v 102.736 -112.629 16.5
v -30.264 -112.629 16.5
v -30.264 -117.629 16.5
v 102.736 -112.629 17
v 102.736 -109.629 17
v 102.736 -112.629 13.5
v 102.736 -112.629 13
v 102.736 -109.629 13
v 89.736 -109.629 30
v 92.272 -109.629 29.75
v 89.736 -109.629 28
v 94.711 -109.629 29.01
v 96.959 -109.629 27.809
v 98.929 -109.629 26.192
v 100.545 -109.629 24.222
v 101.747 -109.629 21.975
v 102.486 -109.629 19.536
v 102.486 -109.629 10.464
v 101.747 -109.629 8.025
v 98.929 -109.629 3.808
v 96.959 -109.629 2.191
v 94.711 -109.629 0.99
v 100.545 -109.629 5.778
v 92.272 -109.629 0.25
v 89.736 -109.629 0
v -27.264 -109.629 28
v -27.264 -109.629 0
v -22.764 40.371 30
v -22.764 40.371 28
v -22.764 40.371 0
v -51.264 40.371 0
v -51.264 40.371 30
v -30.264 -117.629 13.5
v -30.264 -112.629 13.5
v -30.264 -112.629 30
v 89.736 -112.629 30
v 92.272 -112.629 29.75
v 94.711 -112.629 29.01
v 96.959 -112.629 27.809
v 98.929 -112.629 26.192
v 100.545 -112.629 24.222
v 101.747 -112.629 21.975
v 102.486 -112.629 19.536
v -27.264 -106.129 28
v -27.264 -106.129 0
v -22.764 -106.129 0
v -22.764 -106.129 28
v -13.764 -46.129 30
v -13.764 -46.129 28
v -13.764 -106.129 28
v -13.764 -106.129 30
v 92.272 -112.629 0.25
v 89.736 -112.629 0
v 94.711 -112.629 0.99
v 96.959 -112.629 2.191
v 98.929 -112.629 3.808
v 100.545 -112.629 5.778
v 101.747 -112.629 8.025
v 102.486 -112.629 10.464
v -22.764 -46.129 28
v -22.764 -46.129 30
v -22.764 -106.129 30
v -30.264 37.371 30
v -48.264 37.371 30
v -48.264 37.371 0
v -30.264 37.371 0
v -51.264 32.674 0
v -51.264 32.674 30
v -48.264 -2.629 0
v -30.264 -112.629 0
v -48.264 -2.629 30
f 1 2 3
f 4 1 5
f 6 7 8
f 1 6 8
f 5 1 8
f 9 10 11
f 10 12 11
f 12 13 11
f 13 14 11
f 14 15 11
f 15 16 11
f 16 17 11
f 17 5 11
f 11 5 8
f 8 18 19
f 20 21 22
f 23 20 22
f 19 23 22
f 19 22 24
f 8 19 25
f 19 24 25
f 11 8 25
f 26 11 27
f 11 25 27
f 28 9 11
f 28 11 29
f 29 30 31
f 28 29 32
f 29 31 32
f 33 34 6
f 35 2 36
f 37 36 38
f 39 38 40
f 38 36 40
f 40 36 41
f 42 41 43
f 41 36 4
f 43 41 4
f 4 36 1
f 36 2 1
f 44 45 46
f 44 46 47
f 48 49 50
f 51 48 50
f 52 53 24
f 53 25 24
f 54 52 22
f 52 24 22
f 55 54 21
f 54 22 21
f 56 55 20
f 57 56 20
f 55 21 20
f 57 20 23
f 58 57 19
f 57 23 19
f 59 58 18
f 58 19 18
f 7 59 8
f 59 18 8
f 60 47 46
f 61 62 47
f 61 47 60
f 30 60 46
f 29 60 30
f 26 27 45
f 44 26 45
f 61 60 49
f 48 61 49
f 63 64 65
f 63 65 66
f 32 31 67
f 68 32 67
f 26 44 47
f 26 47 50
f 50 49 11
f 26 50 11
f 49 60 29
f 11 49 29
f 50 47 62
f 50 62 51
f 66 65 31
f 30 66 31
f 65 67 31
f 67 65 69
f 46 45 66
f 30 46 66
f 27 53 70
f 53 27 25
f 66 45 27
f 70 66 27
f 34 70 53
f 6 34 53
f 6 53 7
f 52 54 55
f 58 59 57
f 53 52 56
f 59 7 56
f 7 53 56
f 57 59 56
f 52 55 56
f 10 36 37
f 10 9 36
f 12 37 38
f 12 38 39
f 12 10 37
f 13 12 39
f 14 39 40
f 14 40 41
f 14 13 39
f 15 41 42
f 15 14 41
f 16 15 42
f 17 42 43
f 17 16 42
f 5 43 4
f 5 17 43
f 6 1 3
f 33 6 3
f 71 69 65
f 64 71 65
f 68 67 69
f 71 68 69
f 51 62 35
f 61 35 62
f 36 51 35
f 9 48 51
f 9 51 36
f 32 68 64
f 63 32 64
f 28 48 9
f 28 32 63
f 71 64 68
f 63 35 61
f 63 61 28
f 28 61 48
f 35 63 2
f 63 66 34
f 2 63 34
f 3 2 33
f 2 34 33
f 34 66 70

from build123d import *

# Parameters (mm, degrees)
F1_DEPTH  = 30
F2_W      = 133
F2_H      = 3
F3_DEPTH  = 5
F5_DEPTH  = 16.501
F6_R      = 13
F7_W      = 146.5
F7_H      = 30
F8_DEPTH  = 4.5
F10_DEPTH = 2
F11_W     = 9
F11_H     = 60
F12_DEPTH = 2.001


with BuildPart() as f1:
    # F0 (on Top) → F1 (new body)
    with BuildSketch(Plane.XY):
        Polygon((-51.263781, 32.674184), (-48.263781, -2.628919), (-48.263781, 37.371081), (-30.263781, 37.371081), (-30.263781, -112.628919), (102.736219, -112.628919), (102.736219, -109.628919), (-27.263781, -109.628919), (-27.263781, 40.371081), (-51.263781, 40.371081), align=None)
    extrude(amount=F1_DEPTH)

    # F2 (on face) → F3 (join)
    with BuildSketch(Plane.XZ.offset(112.628919)):
        with Locations((36.236219, 15)):
            Rectangle(F2_W, F2_H)
    extrude(amount=F3_DEPTH)

    # F4 (on face) → F5 (cut, through all)
    with BuildSketch(Plane.XY.offset(16.5)):
        Polygon((102.736219, -112.628919), (-30.263781, -117.628919), (102.736219, -117.628919), align=None)
    extrude(amount=-F5_DEPTH, mode=Mode.SUBTRACT)

    # F6
    f6_edges = [f1.edges().sort_by_distance(p)[0] for p in [
        (102.736219, -111.128919, 0),
        (102.736219, -111.128919, 30),
    ]]
    fillet(f6_edges, radius=F6_R)

    # F7 (on face) → F8 (join)
    with BuildSketch(Plane.YZ.offset(-27.263781)):
        with Locations((-32.878919, 15)):
            Rectangle(F7_W, F7_H)
    extrude(amount=F8_DEPTH)

    # F9 (on face) → F10 (join)
    with BuildSketch(Plane.XY.offset(30)):
        Polygon((89.736219, -109.628919), (-22.763781, 40.371081), (-22.763781, -106.128919), (-27.263781, -106.128919), (-27.263781, -109.628919), align=None)
    extrude(amount=-F10_DEPTH)

    # F11 (on face) → F12 (cut, through all)
    with BuildSketch(Plane(origin=(0, 0, 28), x_dir=(1, 0, 0), z_dir=(0, 0, -1))):
        with Locations((-18.263781, 76.128919)):
            Rectangle(F11_W, F11_H)
    extrude(amount=-F12_DEPTH, mode=Mode.SUBTRACT)


solid = f1.part
